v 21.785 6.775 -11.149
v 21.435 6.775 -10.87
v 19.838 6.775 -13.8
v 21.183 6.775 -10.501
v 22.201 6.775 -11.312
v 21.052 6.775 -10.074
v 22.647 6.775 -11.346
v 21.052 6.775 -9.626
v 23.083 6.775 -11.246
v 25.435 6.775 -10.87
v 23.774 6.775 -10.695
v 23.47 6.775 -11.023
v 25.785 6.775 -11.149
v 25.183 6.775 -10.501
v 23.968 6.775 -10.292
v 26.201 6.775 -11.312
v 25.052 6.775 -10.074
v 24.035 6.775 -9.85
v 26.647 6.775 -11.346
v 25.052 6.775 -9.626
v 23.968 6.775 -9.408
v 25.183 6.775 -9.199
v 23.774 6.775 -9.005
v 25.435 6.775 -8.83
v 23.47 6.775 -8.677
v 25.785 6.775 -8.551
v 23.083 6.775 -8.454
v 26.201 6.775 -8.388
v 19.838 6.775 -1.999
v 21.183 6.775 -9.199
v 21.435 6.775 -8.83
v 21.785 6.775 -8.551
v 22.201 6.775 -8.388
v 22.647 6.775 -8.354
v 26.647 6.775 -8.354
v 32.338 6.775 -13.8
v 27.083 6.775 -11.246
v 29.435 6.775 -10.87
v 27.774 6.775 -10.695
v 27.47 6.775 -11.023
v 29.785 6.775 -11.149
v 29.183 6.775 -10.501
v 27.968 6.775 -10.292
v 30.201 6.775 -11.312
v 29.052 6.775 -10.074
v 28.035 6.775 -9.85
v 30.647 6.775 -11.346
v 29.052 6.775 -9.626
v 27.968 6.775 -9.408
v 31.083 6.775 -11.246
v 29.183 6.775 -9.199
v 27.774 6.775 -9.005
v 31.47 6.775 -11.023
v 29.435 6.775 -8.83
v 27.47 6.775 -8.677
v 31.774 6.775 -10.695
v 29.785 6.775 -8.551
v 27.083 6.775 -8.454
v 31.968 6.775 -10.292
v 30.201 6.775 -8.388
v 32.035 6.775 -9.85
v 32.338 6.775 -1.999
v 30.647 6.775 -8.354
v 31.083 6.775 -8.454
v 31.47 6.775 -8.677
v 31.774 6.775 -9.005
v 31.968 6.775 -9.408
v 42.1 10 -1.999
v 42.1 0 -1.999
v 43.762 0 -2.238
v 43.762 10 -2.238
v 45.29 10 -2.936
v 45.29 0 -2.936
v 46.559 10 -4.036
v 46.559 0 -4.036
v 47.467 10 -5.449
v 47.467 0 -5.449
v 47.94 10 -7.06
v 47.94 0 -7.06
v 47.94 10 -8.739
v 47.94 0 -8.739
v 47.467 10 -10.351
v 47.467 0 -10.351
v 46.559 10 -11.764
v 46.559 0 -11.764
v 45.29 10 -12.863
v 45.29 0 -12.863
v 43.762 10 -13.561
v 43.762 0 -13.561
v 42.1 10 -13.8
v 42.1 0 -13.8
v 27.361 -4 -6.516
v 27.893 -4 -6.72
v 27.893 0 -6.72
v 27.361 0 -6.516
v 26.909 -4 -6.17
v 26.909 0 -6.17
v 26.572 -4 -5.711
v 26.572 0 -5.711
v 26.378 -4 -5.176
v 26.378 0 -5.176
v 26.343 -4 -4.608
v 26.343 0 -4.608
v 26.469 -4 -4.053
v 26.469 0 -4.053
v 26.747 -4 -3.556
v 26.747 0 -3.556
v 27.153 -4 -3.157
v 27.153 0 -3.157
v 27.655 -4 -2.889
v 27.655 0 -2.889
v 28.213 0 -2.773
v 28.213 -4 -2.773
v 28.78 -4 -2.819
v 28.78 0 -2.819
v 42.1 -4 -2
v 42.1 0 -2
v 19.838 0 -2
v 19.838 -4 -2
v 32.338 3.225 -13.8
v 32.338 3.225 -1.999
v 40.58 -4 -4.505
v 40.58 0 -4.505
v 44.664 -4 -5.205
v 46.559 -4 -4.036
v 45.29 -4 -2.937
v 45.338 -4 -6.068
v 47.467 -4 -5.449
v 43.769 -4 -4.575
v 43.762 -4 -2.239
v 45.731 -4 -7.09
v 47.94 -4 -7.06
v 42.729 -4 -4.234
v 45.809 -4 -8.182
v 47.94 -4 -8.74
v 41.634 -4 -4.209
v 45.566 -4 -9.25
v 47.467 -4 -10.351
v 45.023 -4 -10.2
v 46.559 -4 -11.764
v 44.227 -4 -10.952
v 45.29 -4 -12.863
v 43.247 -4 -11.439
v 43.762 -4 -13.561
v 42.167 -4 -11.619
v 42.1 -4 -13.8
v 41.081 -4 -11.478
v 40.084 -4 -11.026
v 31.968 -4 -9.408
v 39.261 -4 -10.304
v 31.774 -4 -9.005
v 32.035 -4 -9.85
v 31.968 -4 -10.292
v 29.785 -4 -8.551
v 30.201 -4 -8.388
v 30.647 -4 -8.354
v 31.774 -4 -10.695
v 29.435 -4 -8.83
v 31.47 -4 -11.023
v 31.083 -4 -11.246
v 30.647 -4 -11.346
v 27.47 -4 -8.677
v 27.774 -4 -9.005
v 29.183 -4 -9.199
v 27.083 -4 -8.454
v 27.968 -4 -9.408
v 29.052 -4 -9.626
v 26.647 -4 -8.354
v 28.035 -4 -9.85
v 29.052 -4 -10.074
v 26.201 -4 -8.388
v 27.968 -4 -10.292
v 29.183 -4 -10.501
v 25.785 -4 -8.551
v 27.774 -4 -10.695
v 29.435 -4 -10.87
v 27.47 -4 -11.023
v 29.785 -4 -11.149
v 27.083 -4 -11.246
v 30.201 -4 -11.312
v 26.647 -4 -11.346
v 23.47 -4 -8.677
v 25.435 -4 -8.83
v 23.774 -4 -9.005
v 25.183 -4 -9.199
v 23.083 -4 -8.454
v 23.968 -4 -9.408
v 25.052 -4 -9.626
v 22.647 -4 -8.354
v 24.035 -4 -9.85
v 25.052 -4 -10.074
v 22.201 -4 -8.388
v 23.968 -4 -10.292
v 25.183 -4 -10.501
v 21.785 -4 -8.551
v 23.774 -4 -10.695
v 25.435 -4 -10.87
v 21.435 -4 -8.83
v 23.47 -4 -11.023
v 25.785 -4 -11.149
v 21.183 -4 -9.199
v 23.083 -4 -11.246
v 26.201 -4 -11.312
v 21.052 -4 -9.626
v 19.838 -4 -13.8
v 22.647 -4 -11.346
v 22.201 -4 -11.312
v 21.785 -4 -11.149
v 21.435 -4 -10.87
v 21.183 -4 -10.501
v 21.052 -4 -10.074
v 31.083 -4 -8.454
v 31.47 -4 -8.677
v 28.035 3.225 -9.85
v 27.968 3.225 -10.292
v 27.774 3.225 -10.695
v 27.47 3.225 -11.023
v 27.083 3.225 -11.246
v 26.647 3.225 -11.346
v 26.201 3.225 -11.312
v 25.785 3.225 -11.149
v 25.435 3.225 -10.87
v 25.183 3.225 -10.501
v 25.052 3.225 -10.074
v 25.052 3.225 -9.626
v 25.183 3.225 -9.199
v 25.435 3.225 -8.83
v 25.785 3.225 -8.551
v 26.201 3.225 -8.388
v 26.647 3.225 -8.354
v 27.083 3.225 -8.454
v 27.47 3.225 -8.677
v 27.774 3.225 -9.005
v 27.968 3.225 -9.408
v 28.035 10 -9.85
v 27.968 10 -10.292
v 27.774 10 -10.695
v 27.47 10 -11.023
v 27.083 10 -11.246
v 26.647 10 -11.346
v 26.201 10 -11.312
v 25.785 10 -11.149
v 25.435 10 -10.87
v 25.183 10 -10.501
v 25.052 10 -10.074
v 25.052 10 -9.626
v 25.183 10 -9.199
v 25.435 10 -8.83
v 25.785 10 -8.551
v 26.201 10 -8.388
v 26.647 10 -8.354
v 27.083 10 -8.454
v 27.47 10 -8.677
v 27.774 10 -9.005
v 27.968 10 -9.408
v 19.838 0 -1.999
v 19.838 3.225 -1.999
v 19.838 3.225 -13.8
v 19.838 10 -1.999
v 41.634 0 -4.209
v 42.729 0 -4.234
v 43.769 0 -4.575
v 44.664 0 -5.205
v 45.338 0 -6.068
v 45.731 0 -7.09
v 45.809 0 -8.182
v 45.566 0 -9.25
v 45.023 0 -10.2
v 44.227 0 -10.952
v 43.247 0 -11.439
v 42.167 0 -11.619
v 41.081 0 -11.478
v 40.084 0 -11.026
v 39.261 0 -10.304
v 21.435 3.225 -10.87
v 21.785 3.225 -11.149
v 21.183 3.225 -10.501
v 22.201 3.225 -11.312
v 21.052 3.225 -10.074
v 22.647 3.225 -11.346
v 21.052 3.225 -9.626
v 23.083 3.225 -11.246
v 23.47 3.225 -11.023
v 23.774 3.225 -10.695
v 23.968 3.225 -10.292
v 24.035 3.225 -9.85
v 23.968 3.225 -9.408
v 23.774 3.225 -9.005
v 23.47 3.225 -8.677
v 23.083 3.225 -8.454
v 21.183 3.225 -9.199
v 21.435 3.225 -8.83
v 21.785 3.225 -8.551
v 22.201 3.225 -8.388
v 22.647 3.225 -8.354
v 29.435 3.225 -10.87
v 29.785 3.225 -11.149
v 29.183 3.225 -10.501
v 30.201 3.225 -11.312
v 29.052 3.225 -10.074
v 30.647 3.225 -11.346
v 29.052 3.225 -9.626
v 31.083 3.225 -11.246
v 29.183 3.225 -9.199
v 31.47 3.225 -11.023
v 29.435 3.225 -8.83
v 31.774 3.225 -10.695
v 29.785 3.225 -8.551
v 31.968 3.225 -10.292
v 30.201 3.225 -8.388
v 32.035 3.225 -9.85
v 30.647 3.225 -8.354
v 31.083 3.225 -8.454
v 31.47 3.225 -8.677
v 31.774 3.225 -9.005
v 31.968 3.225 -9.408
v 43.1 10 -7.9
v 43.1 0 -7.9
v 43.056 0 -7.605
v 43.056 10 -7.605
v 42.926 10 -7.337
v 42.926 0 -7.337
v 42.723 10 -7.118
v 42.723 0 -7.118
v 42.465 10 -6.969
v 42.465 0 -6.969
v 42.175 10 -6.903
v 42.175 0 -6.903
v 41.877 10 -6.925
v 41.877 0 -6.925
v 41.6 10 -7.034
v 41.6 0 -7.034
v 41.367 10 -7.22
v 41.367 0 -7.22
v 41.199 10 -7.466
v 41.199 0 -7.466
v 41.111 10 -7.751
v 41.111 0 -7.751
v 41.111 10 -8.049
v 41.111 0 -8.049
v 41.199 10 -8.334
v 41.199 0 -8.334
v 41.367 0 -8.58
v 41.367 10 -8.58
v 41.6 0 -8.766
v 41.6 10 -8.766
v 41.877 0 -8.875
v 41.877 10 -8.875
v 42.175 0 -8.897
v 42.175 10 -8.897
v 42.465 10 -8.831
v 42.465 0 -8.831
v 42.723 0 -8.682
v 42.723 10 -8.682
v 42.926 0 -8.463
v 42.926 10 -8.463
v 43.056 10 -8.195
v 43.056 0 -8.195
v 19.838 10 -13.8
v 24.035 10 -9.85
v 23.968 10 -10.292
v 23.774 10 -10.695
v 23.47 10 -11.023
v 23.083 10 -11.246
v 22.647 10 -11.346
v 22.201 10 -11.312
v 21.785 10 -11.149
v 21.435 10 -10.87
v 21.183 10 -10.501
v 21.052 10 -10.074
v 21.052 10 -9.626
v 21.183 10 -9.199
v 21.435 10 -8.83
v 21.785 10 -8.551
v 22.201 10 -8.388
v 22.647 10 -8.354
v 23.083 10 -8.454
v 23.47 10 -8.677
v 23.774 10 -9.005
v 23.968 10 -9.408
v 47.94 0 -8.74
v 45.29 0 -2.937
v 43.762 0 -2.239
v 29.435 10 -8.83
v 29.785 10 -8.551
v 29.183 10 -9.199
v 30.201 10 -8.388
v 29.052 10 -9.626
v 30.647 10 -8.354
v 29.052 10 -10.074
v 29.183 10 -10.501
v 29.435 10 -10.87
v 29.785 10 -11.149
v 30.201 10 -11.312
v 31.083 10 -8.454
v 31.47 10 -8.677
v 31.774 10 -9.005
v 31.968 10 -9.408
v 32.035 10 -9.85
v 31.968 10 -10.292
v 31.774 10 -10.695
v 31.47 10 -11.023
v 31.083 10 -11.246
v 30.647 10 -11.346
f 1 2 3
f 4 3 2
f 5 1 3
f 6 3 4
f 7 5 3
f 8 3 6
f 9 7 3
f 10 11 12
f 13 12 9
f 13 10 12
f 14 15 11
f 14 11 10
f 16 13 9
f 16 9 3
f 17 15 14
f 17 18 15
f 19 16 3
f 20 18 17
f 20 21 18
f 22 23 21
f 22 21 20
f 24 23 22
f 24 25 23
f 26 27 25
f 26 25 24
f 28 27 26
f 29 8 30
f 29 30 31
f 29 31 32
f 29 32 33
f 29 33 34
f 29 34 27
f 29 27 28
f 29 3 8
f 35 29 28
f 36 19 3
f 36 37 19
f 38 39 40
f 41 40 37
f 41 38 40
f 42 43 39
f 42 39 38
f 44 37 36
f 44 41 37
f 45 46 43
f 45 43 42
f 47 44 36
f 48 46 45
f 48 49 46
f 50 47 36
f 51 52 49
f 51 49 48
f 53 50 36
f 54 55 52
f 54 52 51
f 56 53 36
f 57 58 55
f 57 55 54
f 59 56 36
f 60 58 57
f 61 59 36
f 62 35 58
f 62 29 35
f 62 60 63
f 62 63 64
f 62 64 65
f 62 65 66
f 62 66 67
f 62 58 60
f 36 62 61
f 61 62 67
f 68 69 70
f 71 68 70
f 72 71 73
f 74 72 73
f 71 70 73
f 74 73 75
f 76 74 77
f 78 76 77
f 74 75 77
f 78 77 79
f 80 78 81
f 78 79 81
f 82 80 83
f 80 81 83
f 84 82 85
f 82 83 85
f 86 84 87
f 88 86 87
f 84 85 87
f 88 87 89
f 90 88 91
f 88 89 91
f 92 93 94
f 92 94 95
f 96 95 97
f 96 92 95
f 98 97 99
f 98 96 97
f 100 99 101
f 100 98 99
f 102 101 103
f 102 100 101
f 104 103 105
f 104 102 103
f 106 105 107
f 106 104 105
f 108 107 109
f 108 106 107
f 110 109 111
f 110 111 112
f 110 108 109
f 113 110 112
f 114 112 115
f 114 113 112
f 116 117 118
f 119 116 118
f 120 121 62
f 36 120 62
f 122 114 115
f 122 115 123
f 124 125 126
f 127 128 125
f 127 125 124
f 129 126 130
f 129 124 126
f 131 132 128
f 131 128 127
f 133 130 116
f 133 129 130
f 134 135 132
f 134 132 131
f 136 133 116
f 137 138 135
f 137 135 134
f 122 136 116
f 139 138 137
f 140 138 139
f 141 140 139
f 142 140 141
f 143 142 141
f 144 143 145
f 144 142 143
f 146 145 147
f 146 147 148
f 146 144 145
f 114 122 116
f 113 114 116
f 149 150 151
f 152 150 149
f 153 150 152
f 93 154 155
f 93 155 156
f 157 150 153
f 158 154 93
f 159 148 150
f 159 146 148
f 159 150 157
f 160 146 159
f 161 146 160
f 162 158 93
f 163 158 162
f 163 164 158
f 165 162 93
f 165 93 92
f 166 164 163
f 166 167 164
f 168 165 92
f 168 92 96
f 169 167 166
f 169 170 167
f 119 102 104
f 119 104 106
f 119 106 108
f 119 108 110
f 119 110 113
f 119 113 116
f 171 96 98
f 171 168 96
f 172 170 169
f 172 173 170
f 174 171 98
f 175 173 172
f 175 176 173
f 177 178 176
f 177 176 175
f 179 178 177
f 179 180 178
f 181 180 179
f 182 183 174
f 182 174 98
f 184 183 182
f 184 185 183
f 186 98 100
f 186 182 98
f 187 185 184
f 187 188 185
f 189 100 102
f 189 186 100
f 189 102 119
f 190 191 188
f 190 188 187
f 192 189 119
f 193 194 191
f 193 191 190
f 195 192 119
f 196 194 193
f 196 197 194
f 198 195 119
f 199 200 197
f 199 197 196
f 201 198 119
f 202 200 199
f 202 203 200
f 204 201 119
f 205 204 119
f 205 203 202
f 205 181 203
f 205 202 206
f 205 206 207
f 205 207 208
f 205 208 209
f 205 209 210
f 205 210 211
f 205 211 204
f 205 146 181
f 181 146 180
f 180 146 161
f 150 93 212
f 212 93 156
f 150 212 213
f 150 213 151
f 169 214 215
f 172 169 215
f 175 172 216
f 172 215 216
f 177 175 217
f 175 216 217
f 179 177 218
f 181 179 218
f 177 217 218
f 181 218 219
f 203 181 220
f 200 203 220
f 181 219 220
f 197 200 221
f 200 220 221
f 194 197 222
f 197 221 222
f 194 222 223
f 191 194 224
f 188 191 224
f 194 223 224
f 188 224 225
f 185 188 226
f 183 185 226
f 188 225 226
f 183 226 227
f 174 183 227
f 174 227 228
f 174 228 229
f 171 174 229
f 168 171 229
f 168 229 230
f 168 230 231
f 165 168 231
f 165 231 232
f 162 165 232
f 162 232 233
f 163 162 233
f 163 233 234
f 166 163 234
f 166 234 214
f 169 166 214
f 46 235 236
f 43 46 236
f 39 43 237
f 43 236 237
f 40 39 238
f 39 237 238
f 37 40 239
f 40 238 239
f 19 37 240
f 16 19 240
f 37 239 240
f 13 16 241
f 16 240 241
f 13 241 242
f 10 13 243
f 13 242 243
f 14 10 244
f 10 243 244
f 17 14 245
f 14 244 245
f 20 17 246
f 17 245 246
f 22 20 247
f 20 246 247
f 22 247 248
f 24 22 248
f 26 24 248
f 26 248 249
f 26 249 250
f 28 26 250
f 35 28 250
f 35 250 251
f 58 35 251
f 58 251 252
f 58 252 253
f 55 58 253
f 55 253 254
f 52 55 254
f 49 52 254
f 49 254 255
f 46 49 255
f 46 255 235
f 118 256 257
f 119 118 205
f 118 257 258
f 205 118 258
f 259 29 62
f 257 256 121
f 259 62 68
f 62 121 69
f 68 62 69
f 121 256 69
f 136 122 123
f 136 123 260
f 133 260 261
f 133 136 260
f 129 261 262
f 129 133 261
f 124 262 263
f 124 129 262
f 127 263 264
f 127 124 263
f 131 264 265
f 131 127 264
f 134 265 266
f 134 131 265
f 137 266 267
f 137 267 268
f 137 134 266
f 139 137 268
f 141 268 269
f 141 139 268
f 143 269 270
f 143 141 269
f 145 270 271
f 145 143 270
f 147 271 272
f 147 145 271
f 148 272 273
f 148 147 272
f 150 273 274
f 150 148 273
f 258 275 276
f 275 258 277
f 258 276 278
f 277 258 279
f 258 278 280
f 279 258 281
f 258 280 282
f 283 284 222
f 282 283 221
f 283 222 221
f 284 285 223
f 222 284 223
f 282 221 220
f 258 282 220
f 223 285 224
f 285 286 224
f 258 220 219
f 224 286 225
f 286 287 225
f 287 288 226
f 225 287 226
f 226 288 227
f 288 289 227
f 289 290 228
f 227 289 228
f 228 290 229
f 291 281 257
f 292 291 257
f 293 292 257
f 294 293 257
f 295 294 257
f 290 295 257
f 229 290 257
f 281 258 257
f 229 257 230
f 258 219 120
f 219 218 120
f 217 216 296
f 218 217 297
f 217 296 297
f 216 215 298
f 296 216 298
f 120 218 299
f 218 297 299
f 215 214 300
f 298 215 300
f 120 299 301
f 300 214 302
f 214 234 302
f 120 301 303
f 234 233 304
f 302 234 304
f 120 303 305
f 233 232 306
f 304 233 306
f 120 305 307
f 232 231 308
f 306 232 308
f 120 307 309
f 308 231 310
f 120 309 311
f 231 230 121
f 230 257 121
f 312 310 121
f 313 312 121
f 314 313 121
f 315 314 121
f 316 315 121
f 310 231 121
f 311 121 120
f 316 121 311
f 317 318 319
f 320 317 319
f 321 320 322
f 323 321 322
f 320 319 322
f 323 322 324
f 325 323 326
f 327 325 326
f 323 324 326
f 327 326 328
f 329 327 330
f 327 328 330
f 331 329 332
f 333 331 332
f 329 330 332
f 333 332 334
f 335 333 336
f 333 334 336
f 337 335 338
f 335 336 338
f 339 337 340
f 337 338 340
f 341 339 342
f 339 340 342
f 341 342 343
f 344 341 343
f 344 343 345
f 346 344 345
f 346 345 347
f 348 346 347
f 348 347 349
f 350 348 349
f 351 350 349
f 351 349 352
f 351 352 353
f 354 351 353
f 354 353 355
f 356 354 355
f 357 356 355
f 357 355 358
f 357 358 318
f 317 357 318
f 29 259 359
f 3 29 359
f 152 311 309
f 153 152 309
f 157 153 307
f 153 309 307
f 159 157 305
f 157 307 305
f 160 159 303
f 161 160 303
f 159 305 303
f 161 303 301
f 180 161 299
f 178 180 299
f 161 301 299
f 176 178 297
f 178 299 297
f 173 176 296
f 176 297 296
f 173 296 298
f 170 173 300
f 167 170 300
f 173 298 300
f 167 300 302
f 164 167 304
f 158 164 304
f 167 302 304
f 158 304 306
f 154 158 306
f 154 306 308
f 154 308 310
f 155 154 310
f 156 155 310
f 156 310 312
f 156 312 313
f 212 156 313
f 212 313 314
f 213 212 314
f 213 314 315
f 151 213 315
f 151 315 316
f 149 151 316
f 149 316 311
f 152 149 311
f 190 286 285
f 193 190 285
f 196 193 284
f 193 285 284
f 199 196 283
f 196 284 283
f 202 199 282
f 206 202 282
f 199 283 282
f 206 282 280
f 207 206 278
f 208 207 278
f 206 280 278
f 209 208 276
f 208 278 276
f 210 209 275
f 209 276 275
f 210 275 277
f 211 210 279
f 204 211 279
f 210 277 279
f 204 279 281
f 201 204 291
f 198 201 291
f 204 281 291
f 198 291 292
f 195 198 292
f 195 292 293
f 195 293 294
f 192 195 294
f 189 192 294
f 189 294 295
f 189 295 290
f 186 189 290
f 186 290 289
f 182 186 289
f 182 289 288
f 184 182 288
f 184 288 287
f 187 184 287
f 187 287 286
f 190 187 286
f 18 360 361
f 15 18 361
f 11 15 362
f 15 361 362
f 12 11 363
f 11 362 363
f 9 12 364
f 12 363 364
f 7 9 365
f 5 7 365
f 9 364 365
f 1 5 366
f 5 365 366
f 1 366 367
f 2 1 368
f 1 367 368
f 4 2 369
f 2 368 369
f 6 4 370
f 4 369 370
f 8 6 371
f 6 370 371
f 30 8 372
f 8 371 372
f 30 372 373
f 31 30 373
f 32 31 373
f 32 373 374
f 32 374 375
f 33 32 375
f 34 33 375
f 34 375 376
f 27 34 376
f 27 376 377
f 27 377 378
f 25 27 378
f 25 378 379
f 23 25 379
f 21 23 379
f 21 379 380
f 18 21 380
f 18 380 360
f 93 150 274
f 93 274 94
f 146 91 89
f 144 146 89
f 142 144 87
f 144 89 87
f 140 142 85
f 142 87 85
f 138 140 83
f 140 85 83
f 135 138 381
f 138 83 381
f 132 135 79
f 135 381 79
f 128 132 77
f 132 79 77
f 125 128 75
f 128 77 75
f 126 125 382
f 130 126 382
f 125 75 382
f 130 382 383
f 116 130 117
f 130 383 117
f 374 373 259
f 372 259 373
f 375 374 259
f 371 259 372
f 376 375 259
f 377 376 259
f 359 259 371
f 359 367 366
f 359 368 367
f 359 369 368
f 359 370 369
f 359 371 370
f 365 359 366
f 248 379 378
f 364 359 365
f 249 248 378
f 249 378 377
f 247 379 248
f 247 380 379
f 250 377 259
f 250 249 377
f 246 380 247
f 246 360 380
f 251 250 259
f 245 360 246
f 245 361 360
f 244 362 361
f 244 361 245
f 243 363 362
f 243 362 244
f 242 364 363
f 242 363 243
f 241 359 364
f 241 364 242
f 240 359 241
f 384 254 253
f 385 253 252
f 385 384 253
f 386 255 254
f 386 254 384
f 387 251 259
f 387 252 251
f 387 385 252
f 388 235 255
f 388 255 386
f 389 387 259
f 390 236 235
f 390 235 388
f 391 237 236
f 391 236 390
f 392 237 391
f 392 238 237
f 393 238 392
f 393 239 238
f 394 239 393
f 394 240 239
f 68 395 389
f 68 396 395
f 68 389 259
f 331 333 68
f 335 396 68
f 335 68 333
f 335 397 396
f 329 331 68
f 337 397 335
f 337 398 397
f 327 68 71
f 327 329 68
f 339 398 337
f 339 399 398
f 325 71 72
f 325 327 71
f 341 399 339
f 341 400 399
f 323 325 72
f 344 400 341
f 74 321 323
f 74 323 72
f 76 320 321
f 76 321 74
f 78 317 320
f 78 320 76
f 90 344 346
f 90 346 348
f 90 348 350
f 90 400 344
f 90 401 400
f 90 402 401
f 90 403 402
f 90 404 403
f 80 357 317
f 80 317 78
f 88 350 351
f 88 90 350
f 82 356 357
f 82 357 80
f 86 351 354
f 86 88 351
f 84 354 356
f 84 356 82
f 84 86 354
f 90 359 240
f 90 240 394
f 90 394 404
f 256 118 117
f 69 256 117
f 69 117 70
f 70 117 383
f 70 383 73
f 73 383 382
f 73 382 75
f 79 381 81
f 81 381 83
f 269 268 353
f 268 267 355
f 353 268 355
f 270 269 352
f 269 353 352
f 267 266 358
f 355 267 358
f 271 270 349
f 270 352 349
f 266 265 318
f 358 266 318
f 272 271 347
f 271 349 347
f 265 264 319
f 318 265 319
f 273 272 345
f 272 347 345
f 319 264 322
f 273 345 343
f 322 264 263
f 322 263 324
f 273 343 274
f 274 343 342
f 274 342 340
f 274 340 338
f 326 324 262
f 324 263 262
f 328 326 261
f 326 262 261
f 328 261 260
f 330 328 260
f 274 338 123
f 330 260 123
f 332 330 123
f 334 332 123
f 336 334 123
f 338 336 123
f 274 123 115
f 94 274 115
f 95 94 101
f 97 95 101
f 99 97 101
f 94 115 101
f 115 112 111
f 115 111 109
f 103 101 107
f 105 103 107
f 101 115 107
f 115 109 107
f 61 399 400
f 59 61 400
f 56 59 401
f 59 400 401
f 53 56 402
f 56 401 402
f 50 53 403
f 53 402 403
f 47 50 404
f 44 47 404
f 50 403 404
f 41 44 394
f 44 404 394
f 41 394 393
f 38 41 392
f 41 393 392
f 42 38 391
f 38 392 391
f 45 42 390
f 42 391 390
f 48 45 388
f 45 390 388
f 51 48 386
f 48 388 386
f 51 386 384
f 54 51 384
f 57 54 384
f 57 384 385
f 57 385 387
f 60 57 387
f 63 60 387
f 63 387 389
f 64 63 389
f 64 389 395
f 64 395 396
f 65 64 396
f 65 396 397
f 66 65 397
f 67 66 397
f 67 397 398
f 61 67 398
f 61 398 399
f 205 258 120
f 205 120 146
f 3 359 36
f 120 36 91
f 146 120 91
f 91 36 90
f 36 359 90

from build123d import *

# Parameters (mm, degrees)
BOSS_EXTRUDE2_DEPTH = 10
BOSS_EXTRUDE3_DEPTH = 4
CUT_EXTRUDE1_DEPTH  = 4
SKETCH7_R           = 1
CUT_EXTRUDE2_DEPTH  = 11
SKETCH9_W           = 12.5
SKETCH9_H           = 3.55
CUT_EXTRUDE7_DEPTH  = 12.800523878
SKETCH11_R          = 1.5
CUT_EXTRUDE8_DEPTH  = 15


with BuildPart() as part:
    # Sketch1 → Boss-Extrude2 (new body)
    with BuildSketch(Plane(origin=(0, 0, 0), x_dir=(1, 0, 0), z_dir=(0, 1, 0))):
        with BuildLine():
            Line((19.837809991, 13.8), (19.837809991, 1.999476122))
            Line((19.837809991, 1.999476122), (42.1, 1.999476122))
            ThreePointArc((42.1, 1.999476122), (48.000261939, 7.899738061), (42.1, 13.8))
            Line((42.1, 13.8), (19.837809991, 13.8))
        make_face()
    extrude(amount=BOSS_EXTRUDE2_DEPTH)

    # Sketch4 → Boss-Extrude3 (add)
    with BuildSketch(Plane(origin=(0, 0, 0), x_dir=(-1, 0, 0), z_dir=(0, -1, 0))):
        with BuildLine():
            Line((-19.837809991, 2), (-19.837809991, 13.8))
            Line((-19.837809991, 13.8), (-42.1, 13.8))
            ThreePointArc((-42.1, 13.8), (-48, 7.9), (-42.1, 2))
            Line((-42.1, 2), (-19.837809991, 2))
        make_face()
    extrude(amount=BOSS_EXTRUDE3_DEPTH)

    # Sketch6 → Cut-Extrude1 (cut)
    with BuildSketch(Plane.XZ.offset(4)):
        with BuildLine():
            Line((28.779938833, -2.819139544), (40.580172538, -4.504631907))
            ThreePointArc((40.580172538, -4.504631907), (45.727347719, -8.725074859), (39.261067618, -10.303926565))
            Line((39.261067618, -10.303926565), (27.892761565, -6.719513435))
            ThreePointArc((27.892761565, -6.719513435), (26.386163253, -4.325737856), (28.779938833, -2.819139544))
        make_face()
    extrude(amount=-CUT_EXTRUDE1_DEPTH, mode=Mode.SUBTRACT)

    # Sketch7 → Cut-Extrude2 (cut, through all)
    with BuildSketch(Plane.XZ):
        with Locations((42.1, -7.9)):
            Circle(SKETCH7_R)
    extrude(amount=-CUT_EXTRUDE2_DEPTH, mode=Mode.SUBTRACT)

    # Sketch9 → Cut-Extrude7 (cut, through all)
    with BuildSketch(Plane.XY.offset(-1.999476122)):
        with Locations((26.087809991, 5)):
            Rectangle(SKETCH9_W, SKETCH9_H)
    extrude(amount=-CUT_EXTRUDE7_DEPTH, mode=Mode.SUBTRACT)

    # Sketch11 → Cut-Extrude8 (cut, through all)
    with BuildSketch(Plane(origin=(0, 10, 0), x_dir=(1, 0, 0), z_dir=(0, 1, 0))):
        with Locations((30.53490887, 9.85)):
            Circle(SKETCH11_R)
        with Locations((26.53490887, 9.85)):
            Circle(SKETCH11_R)
        with Locations((22.53490887, 9.85)):
            Circle(SKETCH11_R)
    extrude(amount=-CUT_EXTRUDE8_DEPTH, mode=Mode.SUBTRACT)


solid = part.part
